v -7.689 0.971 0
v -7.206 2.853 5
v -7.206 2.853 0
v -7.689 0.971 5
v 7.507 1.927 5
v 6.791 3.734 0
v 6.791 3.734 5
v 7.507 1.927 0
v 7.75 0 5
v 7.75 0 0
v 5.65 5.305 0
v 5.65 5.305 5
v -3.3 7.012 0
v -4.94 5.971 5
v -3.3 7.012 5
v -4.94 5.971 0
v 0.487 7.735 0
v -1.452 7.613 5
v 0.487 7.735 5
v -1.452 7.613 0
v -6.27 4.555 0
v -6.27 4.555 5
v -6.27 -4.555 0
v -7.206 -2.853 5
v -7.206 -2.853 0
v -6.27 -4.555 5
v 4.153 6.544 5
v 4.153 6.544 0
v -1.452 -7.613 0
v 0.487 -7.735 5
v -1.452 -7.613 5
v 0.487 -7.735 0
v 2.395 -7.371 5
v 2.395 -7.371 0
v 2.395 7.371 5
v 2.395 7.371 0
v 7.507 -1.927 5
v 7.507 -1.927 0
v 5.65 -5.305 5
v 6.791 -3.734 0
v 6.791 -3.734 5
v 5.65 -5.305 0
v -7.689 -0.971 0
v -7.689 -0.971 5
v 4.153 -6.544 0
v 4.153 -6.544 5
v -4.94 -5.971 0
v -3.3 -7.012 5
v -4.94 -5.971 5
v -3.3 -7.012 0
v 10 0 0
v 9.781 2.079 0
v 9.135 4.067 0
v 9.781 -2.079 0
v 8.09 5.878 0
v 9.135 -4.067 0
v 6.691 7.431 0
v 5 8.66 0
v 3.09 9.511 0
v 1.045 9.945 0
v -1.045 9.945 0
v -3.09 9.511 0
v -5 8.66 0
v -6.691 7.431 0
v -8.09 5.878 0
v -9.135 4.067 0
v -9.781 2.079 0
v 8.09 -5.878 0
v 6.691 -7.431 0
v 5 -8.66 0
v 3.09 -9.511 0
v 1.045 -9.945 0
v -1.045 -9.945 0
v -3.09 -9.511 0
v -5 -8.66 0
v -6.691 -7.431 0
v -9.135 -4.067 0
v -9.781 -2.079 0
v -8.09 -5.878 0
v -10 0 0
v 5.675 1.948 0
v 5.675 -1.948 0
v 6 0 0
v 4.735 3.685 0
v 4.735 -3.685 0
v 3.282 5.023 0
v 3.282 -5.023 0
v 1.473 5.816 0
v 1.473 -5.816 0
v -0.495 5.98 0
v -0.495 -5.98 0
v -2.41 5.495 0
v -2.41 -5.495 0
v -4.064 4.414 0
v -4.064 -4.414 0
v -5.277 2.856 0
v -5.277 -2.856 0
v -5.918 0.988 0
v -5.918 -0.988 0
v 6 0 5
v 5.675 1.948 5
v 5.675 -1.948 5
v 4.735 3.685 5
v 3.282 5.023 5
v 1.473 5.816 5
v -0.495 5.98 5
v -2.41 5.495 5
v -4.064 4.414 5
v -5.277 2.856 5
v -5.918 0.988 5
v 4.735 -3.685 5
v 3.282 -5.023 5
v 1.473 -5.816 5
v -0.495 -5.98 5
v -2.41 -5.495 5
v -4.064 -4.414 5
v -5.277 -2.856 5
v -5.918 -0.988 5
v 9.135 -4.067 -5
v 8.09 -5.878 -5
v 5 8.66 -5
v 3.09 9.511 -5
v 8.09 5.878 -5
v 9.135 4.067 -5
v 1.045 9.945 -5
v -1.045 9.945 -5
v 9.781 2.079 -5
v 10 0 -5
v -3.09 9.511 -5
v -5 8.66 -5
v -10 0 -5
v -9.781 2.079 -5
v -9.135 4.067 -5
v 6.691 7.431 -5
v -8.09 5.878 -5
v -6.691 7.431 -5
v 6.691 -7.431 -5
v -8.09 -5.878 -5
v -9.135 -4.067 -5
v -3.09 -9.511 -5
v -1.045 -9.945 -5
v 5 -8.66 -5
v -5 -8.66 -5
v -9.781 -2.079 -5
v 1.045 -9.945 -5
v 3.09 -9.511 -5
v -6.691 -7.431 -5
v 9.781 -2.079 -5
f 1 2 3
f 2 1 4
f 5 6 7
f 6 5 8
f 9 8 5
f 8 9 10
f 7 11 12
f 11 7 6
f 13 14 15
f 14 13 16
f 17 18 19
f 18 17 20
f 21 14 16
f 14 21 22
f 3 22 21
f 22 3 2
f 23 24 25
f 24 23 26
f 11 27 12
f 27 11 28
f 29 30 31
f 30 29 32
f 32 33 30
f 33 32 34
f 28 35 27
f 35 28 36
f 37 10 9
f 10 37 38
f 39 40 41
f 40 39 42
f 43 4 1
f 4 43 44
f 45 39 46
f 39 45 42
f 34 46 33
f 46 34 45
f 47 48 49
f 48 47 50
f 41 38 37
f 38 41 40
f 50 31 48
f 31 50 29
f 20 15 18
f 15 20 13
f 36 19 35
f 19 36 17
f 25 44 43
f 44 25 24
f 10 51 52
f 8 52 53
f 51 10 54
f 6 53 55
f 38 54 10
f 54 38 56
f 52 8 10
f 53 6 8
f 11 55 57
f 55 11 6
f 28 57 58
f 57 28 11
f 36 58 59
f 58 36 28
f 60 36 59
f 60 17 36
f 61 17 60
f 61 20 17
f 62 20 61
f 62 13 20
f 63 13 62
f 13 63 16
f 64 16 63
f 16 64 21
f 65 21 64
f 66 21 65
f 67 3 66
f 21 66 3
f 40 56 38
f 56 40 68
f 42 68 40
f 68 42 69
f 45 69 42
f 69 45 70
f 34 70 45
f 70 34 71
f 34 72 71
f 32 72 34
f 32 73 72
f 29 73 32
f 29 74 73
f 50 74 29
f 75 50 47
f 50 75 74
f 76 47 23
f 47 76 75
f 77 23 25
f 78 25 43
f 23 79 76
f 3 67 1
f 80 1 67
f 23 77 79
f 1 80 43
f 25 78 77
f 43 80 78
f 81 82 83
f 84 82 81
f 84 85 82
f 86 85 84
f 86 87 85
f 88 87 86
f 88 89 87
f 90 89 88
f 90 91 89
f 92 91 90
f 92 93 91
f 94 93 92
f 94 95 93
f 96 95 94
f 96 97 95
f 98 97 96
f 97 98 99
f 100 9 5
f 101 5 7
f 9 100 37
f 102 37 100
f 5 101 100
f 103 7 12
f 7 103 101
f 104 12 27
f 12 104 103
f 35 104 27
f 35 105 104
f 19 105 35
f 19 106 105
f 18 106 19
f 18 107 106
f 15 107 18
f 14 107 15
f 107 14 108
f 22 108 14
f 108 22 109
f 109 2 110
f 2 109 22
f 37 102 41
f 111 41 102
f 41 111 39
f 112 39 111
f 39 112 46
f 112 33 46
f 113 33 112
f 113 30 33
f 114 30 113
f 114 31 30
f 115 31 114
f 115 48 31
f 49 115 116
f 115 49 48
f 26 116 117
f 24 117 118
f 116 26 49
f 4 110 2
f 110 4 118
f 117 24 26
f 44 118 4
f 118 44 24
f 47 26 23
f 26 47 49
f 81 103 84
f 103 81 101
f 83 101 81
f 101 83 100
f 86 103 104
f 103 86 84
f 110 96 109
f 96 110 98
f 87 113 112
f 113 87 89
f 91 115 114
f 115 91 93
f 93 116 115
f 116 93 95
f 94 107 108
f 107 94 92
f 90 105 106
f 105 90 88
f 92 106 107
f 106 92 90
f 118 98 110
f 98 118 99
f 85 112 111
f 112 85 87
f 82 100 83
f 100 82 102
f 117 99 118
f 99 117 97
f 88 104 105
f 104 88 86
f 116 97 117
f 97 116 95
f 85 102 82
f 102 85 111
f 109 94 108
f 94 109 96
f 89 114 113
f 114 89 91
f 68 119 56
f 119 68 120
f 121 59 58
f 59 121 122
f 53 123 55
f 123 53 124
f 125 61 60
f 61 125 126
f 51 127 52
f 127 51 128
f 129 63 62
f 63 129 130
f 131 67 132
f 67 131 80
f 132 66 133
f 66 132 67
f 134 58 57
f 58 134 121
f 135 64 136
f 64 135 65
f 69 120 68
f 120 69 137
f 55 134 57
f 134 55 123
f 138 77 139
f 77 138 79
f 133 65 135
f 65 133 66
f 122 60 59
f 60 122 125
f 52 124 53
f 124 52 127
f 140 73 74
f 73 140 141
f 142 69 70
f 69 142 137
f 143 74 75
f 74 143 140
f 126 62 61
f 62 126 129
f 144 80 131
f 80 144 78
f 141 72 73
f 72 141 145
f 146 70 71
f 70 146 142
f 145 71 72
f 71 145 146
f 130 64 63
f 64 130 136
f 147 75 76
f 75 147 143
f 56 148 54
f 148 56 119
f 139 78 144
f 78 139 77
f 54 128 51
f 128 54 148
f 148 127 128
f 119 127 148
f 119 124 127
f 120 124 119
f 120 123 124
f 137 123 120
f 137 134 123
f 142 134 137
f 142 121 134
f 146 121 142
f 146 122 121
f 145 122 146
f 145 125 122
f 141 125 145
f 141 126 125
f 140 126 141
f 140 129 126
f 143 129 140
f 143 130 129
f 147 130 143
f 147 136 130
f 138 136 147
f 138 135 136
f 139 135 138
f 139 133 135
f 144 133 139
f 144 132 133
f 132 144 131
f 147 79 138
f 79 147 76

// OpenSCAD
module chair_foot()
{
    scale([ 1, 1, -1 ]) cylinder(h = 5, d = 20);
    difference()
    {
        cylinder(h = 5, d = 15.5);
        cylinder(h = 30, d = 12, center = true);
    }
}

chair_foot();
